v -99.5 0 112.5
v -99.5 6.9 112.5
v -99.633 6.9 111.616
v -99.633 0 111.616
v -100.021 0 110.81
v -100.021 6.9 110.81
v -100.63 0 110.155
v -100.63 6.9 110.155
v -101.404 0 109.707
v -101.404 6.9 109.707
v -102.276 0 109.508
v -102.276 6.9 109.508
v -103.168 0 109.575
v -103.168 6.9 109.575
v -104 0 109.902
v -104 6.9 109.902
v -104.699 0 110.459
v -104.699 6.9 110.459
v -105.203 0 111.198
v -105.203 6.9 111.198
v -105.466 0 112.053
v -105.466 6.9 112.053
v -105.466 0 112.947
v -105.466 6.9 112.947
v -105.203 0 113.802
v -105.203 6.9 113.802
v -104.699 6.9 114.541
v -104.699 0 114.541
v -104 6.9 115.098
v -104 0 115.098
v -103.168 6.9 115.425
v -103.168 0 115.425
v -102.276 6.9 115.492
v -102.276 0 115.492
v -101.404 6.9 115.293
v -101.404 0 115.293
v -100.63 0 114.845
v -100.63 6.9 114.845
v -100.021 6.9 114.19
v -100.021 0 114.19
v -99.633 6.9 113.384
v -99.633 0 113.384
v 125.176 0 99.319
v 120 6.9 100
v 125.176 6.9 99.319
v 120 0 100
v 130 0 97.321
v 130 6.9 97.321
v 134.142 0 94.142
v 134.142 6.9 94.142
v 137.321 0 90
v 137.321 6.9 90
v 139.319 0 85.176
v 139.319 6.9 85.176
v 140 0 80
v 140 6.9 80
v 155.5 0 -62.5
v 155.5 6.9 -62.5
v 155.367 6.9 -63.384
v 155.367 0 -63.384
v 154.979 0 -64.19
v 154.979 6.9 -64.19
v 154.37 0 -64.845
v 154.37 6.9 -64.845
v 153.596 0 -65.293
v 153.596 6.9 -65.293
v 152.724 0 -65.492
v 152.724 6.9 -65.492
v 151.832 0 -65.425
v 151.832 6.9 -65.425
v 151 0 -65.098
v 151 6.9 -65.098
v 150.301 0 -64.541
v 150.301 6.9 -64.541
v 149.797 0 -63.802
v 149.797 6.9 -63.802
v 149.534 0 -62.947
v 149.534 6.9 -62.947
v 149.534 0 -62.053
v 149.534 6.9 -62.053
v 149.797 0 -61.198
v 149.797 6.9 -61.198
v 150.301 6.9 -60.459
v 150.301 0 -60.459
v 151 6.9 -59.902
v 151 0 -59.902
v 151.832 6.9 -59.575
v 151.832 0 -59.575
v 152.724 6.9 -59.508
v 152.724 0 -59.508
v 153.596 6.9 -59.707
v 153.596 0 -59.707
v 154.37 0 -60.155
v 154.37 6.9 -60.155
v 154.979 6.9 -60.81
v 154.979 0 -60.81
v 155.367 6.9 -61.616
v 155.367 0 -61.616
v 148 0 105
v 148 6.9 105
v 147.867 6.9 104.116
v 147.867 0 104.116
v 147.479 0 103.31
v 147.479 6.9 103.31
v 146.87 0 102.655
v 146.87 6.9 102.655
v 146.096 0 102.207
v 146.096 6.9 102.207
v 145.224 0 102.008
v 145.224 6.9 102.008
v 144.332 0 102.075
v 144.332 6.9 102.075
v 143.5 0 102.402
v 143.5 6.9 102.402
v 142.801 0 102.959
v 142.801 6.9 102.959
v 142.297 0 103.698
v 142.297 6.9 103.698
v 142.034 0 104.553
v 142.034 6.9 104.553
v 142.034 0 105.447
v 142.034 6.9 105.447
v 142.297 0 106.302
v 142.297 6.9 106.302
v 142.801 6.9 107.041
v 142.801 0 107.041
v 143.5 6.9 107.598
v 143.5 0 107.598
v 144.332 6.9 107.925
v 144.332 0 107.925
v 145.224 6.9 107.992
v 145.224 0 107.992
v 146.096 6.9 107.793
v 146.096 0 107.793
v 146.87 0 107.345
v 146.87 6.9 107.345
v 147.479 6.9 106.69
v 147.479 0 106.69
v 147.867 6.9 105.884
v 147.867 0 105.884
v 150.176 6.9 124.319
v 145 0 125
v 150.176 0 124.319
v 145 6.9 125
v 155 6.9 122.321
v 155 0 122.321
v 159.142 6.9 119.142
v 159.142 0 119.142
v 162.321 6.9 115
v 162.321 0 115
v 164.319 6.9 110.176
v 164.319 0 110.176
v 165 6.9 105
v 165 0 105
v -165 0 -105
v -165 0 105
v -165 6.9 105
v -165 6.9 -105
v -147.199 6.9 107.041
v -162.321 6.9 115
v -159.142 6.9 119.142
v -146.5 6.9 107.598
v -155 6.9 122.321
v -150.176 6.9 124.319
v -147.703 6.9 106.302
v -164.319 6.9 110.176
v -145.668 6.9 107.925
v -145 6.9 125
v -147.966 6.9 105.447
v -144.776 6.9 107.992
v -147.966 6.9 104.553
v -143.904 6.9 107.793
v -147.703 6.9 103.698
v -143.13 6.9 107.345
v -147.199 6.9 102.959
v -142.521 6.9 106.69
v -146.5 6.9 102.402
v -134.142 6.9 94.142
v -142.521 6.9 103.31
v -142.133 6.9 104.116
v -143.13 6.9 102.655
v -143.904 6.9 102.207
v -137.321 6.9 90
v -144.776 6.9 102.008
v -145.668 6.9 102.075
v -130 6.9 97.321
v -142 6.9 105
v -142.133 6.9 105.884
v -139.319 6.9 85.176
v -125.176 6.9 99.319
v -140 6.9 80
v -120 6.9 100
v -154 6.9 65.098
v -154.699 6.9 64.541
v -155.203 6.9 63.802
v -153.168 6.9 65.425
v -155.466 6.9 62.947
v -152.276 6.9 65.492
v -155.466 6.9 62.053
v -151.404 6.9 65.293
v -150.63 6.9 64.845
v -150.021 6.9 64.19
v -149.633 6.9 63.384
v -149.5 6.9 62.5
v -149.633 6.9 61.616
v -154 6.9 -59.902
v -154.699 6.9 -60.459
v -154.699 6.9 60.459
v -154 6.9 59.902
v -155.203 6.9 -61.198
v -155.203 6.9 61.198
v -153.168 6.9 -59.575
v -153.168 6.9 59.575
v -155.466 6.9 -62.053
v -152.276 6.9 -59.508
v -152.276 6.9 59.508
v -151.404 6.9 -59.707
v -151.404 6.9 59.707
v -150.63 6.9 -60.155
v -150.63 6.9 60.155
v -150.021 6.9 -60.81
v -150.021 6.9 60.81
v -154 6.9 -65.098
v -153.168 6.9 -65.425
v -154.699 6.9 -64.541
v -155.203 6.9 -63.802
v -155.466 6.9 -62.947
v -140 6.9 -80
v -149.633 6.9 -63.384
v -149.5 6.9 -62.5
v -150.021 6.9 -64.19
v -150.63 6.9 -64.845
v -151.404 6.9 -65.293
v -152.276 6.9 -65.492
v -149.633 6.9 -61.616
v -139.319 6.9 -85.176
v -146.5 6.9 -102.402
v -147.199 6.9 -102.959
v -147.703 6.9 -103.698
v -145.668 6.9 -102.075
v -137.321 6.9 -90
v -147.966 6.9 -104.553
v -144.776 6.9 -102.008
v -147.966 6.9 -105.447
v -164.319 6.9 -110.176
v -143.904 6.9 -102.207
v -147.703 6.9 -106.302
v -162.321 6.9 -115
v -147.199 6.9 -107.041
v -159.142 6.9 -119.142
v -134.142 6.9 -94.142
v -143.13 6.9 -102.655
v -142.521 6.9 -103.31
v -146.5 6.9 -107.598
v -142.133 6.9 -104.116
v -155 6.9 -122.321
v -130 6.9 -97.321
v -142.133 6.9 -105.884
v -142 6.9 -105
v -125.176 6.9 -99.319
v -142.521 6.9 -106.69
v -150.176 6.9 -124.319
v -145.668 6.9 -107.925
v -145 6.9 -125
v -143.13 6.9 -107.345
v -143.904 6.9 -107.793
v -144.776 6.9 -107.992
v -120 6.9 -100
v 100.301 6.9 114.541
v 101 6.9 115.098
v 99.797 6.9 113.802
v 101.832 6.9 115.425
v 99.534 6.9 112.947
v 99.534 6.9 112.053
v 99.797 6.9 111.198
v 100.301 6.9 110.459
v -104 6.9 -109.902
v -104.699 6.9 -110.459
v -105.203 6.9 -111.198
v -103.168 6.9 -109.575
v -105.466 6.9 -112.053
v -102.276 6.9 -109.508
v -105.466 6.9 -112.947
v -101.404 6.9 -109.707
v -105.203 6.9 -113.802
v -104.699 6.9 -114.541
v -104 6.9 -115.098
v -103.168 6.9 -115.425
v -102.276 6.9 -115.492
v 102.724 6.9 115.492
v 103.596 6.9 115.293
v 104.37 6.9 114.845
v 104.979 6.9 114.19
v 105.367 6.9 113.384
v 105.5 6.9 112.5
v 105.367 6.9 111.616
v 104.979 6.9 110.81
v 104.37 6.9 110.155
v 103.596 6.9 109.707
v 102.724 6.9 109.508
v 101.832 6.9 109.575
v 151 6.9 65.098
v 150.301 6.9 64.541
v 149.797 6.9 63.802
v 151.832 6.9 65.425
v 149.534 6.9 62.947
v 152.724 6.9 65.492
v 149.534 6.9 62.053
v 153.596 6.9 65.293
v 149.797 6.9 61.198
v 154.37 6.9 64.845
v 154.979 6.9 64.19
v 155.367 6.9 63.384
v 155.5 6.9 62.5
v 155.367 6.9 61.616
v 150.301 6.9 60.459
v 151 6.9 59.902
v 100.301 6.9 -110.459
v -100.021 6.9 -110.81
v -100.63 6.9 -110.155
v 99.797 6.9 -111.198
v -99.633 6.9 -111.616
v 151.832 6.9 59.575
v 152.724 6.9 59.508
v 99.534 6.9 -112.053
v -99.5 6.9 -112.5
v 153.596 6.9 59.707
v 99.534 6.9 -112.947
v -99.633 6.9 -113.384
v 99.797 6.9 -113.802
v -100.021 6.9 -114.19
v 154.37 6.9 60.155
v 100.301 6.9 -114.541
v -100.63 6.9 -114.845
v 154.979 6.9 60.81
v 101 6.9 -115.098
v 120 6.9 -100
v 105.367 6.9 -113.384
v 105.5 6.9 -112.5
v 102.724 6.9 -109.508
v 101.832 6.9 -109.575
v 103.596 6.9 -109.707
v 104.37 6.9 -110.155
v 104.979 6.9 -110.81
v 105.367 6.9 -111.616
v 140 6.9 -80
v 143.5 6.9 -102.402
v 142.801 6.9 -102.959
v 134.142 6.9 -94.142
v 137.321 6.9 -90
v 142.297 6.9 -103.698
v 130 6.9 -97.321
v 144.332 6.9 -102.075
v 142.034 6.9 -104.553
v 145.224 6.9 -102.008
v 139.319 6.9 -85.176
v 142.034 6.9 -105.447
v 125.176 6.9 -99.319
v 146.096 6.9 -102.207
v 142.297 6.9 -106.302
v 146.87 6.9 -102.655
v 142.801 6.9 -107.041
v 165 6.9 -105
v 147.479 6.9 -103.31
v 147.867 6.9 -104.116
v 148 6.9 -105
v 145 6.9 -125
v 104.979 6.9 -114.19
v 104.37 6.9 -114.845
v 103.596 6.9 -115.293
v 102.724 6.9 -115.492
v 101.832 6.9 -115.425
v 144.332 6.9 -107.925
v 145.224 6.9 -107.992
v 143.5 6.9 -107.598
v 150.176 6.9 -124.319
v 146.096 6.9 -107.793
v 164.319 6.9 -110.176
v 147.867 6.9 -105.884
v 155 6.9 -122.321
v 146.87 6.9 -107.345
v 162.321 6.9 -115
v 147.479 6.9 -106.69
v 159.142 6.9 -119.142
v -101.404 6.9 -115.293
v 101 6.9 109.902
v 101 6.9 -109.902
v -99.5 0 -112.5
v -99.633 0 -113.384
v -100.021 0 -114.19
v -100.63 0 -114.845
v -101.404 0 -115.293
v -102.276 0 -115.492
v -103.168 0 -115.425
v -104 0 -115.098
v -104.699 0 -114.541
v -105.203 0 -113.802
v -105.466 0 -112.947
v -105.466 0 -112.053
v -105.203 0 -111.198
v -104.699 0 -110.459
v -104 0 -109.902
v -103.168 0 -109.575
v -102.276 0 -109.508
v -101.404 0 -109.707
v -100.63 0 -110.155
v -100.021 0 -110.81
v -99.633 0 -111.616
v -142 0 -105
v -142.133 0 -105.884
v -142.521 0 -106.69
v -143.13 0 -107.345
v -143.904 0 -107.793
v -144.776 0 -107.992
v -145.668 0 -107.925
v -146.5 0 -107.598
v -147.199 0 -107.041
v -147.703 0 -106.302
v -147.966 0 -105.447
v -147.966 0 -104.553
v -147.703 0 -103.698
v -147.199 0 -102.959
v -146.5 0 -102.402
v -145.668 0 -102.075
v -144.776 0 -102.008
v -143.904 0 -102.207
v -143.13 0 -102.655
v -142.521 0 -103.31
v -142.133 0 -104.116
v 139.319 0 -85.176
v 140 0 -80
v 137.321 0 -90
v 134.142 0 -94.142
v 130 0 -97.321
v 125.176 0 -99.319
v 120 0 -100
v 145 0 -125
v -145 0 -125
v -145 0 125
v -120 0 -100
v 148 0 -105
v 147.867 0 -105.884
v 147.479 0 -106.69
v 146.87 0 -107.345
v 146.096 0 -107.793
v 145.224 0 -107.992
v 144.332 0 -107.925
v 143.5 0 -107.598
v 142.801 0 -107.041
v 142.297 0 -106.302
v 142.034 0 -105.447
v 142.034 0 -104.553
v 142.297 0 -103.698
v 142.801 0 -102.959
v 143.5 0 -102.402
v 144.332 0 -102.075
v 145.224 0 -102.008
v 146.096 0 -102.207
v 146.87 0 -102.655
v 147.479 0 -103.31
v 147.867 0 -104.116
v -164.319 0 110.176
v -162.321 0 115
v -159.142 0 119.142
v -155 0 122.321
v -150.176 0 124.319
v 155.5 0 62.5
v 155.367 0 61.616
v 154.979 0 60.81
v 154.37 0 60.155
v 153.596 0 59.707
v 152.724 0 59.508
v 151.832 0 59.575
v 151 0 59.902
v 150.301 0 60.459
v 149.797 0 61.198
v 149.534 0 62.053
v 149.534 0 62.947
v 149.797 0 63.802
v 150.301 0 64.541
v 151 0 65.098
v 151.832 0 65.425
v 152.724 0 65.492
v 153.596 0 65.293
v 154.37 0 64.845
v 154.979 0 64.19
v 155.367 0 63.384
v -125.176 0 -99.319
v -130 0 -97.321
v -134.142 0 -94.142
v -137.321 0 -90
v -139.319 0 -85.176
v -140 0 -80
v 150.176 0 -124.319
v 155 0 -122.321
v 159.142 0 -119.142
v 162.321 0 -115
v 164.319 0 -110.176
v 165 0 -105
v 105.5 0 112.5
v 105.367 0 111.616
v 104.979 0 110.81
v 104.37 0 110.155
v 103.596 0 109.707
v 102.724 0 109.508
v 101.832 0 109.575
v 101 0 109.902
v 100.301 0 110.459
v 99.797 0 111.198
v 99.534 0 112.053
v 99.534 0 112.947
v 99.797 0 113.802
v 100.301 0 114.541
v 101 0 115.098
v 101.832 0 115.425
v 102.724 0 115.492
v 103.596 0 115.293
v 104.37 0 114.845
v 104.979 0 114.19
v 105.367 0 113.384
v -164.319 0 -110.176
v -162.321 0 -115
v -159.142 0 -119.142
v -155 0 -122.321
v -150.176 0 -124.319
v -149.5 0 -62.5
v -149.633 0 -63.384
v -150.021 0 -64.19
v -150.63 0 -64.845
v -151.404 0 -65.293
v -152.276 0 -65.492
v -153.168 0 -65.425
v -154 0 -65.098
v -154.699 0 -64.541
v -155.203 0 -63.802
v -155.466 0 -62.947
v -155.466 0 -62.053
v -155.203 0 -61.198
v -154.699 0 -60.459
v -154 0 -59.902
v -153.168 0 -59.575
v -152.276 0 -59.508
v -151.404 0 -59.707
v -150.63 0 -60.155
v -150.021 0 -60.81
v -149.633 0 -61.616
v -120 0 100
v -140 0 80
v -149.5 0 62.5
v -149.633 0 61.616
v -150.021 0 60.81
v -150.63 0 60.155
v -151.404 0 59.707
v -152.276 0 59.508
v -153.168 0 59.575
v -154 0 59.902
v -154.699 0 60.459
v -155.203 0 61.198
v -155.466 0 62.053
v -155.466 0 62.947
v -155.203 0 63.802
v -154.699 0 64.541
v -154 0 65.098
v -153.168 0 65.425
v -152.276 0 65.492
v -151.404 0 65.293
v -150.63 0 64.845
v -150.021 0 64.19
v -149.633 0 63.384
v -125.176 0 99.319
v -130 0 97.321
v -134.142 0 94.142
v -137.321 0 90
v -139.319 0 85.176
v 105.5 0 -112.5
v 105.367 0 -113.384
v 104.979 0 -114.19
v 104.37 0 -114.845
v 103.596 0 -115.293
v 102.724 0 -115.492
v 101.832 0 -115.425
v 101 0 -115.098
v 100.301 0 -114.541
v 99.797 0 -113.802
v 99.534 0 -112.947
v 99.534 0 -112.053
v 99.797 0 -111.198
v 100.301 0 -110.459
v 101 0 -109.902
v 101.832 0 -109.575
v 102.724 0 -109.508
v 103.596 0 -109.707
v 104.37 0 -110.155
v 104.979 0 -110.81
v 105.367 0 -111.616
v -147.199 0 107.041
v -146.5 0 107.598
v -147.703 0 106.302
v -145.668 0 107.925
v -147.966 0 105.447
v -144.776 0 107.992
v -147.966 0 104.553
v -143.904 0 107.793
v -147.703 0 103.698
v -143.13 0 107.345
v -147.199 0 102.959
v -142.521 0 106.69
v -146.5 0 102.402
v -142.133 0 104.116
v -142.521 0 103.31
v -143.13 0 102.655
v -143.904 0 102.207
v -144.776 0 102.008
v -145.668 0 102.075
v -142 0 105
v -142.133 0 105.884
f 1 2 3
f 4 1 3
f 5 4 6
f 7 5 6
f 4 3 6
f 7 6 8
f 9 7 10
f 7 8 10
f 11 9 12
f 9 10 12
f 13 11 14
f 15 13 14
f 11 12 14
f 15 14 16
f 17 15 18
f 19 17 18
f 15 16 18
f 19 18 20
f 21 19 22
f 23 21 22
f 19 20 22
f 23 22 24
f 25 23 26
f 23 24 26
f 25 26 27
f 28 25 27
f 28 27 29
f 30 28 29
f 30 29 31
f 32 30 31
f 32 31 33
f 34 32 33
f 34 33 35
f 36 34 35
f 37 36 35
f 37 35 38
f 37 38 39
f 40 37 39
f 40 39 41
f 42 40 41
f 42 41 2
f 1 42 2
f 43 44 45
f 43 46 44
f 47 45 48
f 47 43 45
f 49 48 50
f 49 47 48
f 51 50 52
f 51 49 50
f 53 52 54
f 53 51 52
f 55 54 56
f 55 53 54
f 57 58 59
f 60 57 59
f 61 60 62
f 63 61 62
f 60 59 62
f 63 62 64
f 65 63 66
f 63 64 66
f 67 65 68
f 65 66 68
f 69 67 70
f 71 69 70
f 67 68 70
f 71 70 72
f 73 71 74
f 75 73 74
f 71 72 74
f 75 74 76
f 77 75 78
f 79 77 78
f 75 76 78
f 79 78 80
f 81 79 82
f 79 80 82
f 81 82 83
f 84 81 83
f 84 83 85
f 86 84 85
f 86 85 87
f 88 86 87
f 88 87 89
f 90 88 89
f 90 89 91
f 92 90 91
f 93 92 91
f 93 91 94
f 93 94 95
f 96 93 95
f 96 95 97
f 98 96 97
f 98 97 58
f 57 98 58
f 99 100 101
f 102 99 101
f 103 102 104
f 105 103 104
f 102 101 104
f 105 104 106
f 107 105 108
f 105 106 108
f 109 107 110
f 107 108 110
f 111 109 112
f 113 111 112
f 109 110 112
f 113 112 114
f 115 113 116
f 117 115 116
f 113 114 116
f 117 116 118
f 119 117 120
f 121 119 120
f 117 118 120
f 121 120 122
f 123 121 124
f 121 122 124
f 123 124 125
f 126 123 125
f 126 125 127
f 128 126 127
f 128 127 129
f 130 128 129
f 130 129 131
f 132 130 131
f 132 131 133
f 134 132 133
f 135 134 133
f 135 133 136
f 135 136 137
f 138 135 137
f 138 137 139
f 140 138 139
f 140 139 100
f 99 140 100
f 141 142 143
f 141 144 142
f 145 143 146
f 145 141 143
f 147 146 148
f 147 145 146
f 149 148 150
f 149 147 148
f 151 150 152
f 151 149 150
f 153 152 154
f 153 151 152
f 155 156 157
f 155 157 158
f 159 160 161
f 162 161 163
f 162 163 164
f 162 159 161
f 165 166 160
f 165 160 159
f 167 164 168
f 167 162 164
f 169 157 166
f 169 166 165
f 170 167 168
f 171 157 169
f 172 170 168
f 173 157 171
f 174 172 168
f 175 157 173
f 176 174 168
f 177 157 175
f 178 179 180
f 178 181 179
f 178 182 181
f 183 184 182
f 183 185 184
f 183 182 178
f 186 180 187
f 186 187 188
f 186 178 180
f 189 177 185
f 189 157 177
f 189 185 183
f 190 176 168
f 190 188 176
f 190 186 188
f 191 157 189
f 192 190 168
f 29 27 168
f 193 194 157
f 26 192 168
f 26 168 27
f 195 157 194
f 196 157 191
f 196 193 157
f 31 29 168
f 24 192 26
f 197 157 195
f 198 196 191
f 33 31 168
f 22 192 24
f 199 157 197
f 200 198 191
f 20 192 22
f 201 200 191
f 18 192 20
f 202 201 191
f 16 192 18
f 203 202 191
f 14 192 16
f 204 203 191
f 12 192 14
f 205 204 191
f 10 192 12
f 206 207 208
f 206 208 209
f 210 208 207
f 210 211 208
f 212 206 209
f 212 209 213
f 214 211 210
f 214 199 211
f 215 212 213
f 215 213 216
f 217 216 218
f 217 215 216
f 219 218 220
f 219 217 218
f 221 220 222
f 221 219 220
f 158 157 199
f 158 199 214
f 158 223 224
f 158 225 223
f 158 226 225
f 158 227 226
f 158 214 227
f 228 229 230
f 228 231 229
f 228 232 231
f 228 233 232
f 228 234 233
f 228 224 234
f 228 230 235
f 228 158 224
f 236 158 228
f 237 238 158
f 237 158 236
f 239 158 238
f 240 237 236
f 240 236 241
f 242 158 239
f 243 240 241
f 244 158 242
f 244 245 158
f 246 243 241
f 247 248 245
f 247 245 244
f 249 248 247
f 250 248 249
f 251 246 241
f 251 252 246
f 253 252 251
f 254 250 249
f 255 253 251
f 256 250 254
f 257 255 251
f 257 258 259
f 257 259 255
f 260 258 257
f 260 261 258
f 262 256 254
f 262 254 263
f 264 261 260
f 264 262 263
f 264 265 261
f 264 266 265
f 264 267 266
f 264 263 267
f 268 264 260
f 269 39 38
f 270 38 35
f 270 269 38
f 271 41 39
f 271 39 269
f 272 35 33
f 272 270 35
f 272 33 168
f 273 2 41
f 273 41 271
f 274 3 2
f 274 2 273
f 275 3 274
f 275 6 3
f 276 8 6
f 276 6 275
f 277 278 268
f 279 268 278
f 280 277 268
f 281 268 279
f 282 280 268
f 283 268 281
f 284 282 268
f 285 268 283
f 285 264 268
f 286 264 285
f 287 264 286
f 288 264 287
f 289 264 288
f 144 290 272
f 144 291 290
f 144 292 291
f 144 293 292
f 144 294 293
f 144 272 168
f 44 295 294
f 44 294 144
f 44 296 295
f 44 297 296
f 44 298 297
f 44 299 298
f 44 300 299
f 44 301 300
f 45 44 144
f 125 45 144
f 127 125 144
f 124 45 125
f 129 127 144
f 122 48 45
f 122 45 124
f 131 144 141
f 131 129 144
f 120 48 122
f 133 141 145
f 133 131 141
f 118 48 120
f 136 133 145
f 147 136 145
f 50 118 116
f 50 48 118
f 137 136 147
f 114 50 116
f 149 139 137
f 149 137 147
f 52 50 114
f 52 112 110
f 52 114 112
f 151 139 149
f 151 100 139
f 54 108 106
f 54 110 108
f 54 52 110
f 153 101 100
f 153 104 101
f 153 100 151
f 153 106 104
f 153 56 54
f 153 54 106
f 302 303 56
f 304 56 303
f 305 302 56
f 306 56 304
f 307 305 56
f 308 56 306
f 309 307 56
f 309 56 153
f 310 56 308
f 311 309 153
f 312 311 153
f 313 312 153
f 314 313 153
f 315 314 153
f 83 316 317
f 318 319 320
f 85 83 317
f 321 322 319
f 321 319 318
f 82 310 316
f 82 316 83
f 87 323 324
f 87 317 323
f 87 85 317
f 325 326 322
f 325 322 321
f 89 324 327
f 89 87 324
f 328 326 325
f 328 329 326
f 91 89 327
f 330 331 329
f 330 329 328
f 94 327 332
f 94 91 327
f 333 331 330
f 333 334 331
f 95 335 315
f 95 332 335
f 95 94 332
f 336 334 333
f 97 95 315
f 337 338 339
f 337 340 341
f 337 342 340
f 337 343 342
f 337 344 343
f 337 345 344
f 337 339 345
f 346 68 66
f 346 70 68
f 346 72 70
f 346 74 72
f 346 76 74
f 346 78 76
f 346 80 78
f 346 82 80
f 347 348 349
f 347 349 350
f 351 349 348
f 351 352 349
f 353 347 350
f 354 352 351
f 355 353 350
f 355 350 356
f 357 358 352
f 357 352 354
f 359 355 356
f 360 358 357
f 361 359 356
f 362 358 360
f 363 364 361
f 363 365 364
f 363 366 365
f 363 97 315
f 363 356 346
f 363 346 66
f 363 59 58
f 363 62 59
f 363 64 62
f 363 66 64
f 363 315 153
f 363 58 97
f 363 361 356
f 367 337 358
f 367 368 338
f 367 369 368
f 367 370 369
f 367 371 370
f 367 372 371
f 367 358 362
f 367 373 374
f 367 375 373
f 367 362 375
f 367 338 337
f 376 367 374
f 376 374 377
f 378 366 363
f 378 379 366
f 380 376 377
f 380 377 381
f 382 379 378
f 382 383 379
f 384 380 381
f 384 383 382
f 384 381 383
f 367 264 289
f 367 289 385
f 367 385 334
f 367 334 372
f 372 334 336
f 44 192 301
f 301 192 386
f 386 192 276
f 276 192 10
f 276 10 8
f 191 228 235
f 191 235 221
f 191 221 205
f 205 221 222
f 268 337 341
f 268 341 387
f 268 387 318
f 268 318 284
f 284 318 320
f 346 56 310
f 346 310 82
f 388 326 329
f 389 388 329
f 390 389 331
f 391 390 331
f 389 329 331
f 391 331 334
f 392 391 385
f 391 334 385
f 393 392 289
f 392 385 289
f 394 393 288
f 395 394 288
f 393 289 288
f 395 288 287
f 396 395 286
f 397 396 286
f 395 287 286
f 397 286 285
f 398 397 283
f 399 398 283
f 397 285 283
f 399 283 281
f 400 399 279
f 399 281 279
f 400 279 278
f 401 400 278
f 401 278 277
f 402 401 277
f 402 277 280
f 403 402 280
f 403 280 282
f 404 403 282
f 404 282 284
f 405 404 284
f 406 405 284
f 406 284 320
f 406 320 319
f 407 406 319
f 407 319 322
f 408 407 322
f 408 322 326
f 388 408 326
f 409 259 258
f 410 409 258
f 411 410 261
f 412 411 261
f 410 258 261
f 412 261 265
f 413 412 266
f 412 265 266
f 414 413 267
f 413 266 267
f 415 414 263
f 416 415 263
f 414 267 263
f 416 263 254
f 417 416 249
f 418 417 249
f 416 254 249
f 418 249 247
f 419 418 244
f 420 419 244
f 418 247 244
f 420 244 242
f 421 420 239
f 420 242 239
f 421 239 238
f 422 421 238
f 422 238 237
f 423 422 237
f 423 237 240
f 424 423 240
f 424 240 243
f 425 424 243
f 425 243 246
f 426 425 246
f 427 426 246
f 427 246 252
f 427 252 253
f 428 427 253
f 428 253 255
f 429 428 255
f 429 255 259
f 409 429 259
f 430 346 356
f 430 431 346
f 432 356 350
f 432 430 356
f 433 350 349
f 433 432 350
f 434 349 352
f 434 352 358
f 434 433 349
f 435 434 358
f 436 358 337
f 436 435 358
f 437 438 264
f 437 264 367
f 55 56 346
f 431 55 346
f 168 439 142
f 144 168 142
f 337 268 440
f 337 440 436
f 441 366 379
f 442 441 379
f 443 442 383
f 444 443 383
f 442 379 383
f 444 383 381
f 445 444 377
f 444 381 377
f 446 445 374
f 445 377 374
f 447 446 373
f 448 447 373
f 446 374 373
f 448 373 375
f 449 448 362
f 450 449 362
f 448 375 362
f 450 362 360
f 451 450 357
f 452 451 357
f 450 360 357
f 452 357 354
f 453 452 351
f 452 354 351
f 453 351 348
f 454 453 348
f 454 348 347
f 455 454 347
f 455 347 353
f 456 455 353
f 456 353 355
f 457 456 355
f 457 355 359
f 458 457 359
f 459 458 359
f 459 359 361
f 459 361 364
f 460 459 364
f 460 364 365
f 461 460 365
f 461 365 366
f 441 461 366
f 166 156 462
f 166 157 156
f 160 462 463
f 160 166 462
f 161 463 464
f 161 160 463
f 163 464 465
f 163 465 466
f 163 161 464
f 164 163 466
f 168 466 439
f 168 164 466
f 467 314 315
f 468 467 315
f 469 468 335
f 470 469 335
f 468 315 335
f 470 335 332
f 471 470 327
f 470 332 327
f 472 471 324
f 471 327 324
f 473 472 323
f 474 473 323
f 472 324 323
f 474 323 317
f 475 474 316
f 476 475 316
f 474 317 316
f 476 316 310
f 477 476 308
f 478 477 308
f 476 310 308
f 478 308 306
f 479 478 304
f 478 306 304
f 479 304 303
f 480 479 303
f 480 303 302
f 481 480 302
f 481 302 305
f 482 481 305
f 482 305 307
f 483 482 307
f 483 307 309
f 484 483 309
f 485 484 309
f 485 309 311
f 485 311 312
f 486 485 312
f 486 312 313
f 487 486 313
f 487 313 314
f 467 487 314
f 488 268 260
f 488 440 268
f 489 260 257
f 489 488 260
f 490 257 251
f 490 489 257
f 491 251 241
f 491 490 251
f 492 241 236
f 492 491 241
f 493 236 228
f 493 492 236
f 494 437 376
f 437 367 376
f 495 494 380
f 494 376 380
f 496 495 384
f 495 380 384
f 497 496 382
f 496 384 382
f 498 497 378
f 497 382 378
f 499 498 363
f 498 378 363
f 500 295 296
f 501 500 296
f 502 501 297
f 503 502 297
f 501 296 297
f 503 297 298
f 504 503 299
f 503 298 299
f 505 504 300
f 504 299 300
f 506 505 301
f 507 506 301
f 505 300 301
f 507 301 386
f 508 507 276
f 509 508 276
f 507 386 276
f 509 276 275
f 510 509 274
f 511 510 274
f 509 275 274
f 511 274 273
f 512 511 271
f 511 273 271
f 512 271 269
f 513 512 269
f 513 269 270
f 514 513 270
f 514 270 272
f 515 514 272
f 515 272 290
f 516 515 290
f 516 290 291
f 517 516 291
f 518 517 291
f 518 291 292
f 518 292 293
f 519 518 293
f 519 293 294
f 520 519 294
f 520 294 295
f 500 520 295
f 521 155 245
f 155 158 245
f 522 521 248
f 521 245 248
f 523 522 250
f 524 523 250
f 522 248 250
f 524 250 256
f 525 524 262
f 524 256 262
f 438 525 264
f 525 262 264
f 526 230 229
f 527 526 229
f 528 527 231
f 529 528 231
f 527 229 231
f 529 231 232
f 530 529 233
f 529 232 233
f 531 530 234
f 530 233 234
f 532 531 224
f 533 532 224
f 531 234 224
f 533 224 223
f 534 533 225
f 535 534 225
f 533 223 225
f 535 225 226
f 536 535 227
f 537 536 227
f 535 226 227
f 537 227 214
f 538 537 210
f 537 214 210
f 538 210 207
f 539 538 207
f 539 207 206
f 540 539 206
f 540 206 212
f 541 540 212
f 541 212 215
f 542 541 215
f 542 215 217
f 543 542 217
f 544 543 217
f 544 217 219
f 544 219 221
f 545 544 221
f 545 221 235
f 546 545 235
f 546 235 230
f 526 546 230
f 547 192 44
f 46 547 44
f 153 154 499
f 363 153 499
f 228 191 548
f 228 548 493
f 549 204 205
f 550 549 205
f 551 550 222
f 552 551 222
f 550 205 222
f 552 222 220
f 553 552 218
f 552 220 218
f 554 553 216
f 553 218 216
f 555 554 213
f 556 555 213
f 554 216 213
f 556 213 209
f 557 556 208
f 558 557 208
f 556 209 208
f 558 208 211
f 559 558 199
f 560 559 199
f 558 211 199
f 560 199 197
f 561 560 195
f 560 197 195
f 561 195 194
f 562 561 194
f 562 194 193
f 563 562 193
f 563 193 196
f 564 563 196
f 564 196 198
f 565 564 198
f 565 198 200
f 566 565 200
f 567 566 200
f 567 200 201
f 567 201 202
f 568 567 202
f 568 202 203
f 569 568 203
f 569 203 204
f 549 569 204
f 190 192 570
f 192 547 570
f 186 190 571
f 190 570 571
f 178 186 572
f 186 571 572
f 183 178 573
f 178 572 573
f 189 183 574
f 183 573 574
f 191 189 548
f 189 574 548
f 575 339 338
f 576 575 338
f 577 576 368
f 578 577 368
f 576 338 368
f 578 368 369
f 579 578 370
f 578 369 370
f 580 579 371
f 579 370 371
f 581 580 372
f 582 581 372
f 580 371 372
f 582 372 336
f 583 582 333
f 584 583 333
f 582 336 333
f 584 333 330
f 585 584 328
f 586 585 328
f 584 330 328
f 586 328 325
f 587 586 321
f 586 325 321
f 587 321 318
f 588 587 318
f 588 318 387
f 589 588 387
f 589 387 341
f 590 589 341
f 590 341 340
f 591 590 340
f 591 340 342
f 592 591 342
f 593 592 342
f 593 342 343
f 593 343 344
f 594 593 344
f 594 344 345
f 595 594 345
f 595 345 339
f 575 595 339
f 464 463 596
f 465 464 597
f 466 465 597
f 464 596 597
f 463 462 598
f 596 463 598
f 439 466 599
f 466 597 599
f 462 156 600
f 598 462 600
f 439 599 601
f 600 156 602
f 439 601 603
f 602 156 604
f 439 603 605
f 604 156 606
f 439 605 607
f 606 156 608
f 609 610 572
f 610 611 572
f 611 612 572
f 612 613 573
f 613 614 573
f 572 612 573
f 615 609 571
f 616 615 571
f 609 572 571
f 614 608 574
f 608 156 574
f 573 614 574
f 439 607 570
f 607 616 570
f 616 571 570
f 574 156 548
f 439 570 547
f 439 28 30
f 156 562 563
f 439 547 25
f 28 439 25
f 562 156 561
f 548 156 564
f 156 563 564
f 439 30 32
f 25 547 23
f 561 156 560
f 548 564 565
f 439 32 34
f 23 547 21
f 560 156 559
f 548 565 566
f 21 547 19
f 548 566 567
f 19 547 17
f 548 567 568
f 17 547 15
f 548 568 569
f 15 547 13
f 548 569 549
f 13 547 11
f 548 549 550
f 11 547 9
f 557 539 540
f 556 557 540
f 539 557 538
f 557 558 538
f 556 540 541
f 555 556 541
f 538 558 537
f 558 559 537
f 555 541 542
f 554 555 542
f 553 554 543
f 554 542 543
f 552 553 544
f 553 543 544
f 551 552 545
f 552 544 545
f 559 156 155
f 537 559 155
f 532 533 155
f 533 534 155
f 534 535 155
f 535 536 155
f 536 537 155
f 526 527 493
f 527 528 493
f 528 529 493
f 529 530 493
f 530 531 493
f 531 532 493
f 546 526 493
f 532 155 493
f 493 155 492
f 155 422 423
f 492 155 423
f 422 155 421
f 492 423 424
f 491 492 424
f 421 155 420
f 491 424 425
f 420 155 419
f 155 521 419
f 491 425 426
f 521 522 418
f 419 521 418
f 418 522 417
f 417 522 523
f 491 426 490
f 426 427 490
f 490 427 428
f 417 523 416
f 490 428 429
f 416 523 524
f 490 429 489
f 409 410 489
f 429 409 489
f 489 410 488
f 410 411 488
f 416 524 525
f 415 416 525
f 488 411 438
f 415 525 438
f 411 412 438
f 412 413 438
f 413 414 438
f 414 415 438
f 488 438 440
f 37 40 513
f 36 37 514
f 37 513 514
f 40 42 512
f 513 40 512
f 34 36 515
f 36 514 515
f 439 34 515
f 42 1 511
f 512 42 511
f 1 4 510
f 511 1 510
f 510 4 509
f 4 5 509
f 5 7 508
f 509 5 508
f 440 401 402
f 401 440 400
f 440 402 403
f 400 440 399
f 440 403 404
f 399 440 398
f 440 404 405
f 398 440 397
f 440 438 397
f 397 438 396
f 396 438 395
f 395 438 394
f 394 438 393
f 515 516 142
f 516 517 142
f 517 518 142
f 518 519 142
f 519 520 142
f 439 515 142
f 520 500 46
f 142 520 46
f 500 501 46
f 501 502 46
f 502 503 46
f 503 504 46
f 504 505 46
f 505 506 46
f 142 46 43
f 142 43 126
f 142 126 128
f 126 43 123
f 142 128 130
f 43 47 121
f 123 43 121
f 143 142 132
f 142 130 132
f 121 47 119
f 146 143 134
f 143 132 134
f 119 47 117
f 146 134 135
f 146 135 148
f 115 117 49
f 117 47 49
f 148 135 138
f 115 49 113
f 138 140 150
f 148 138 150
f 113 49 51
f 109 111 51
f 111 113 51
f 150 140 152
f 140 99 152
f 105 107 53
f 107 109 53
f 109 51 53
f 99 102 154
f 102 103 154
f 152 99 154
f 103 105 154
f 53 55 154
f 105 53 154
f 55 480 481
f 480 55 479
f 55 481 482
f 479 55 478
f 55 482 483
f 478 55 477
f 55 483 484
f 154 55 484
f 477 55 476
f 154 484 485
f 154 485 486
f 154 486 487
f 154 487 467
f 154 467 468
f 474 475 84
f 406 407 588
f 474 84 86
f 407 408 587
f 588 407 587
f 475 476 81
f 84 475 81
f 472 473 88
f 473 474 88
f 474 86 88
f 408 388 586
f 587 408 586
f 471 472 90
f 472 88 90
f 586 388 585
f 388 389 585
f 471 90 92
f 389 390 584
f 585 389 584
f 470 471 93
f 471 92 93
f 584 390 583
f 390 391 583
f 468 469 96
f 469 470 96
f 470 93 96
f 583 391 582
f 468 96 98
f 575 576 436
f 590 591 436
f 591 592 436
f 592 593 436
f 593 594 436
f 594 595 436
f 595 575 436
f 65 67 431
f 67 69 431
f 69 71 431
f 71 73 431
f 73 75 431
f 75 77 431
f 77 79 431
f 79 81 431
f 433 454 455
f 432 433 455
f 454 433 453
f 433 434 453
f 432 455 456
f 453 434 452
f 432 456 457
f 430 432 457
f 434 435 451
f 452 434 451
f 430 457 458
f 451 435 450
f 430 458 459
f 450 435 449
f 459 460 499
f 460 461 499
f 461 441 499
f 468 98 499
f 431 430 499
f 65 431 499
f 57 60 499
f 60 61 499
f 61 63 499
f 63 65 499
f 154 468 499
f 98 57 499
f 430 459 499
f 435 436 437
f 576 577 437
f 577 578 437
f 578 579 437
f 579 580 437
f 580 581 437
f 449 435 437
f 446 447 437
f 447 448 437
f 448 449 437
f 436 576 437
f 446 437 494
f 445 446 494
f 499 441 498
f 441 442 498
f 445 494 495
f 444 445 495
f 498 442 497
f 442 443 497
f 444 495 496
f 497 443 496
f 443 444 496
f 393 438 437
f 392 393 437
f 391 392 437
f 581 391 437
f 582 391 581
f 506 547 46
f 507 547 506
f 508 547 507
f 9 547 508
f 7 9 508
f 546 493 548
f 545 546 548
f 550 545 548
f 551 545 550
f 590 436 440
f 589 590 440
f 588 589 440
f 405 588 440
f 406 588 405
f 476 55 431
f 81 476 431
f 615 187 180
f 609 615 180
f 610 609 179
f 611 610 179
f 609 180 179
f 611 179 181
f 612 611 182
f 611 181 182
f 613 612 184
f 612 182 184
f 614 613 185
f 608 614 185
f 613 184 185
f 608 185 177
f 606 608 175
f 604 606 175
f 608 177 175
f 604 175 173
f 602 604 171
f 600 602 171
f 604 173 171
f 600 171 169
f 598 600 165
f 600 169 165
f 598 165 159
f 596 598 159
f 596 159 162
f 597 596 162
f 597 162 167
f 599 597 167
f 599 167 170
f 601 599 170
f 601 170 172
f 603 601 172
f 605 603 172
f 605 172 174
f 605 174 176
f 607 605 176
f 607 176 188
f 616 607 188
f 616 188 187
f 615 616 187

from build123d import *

# Parameters (mm, degrees)
SKETCH1_W           = 330
SKETCH1_H           = 250
BOSS_EXTRUDE1_DEPTH = 6.9
SKETCH2_R           = 3
CUT_EXTRUDE1_DEPTH  = 7.9
SKETCH3_W           = 280
SKETCH3_H           = 200
CUT_EXTRUDE2_DEPTH  = 7.9
FILLET1_R           = 20
FILLET2_R           = 20
SKETCH4_R           = 3
CUT_EXTRUDE3_DEPTH  = 7.9


with BuildPart() as part:
    # Sketch1 → Boss-Extrude1 (new body)
    with BuildSketch(Plane(origin=(0, 0, 0), x_dir=(1, 0, 0), z_dir=(0, 1, 0))):
        Rectangle(SKETCH1_W, SKETCH1_H)
    extrude(amount=BOSS_EXTRUDE1_DEPTH)

    # Sketch2 → Cut-Extrude1 (cut, through all)
    with BuildSketch(Plane(origin=(0, 6.9, 0), x_dir=(1, 0, 0), z_dir=(0, 1, 0))):
        with Locations((-145, 105)):
            Circle(SKETCH2_R)
        with Locations((145, 105)):
            Circle(SKETCH2_R)
        with Locations((145, -105)):
            Circle(SKETCH2_R)
        with Locations((-145, -105)):
            Circle(SKETCH2_R)
    extrude(amount=-CUT_EXTRUDE1_DEPTH, mode=Mode.SUBTRACT)

    # Sketch3 → Cut-Extrude2 (cut, through all)
    with BuildSketch(Plane(origin=(0, 6.9, 0), x_dir=(1, 0, 0), z_dir=(0, 1, 0))):
        Rectangle(SKETCH3_W, SKETCH3_H)
    extrude(amount=-CUT_EXTRUDE2_DEPTH, mode=Mode.SUBTRACT)

    # Fillet1
    fillet1_edges = [part.edges().sort_by_distance(p)[0] for p in [
        (-165, 3.45, -125),
        (165, 3.45, -125),
        (165, 3.45, 125),
        (-165, 3.45, 125),
    ]]
    fillet(fillet1_edges, radius=FILLET1_R)

    # Fillet2
    fillet2_edges = [part.edges().sort_by_distance(p)[0] for p in [
        (-140, 3.45, 100),
        (-140, 3.45, -100),
        (140, 3.45, -100),
        (140, 3.45, 100),
    ]]
    fillet(fillet2_edges, radius=FILLET2_R)

    # Sketch4 → Cut-Extrude3 (cut, through all)
    with BuildSketch(Plane(origin=(0, 6.9, 0), x_dir=(1, 0, 0), z_dir=(0, 1, 0))):
        with Locations((-152.5, -62.5)):
            Circle(SKETCH4_R)
        with Locations((-102.5, -112.5)):
            Circle(SKETCH4_R)
        with Locations((102.5, -112.5)):
            Circle(SKETCH4_R)
        with Locations((152.5, -62.5)):
            Circle(SKETCH4_R)
        with Locations((152.5, 62.5)):
            Circle(SKETCH4_R)
        with Locations((102.5, 112.5)):
            Circle(SKETCH4_R)
        with Locations((-102.5, 112.5)):
            Circle(SKETCH4_R)
        with Locations((-152.5, 62.5)):
            Circle(SKETCH4_R)
    extrude(amount=-CUT_EXTRUDE3_DEPTH, mode=Mode.SUBTRACT)


solid = part.part
